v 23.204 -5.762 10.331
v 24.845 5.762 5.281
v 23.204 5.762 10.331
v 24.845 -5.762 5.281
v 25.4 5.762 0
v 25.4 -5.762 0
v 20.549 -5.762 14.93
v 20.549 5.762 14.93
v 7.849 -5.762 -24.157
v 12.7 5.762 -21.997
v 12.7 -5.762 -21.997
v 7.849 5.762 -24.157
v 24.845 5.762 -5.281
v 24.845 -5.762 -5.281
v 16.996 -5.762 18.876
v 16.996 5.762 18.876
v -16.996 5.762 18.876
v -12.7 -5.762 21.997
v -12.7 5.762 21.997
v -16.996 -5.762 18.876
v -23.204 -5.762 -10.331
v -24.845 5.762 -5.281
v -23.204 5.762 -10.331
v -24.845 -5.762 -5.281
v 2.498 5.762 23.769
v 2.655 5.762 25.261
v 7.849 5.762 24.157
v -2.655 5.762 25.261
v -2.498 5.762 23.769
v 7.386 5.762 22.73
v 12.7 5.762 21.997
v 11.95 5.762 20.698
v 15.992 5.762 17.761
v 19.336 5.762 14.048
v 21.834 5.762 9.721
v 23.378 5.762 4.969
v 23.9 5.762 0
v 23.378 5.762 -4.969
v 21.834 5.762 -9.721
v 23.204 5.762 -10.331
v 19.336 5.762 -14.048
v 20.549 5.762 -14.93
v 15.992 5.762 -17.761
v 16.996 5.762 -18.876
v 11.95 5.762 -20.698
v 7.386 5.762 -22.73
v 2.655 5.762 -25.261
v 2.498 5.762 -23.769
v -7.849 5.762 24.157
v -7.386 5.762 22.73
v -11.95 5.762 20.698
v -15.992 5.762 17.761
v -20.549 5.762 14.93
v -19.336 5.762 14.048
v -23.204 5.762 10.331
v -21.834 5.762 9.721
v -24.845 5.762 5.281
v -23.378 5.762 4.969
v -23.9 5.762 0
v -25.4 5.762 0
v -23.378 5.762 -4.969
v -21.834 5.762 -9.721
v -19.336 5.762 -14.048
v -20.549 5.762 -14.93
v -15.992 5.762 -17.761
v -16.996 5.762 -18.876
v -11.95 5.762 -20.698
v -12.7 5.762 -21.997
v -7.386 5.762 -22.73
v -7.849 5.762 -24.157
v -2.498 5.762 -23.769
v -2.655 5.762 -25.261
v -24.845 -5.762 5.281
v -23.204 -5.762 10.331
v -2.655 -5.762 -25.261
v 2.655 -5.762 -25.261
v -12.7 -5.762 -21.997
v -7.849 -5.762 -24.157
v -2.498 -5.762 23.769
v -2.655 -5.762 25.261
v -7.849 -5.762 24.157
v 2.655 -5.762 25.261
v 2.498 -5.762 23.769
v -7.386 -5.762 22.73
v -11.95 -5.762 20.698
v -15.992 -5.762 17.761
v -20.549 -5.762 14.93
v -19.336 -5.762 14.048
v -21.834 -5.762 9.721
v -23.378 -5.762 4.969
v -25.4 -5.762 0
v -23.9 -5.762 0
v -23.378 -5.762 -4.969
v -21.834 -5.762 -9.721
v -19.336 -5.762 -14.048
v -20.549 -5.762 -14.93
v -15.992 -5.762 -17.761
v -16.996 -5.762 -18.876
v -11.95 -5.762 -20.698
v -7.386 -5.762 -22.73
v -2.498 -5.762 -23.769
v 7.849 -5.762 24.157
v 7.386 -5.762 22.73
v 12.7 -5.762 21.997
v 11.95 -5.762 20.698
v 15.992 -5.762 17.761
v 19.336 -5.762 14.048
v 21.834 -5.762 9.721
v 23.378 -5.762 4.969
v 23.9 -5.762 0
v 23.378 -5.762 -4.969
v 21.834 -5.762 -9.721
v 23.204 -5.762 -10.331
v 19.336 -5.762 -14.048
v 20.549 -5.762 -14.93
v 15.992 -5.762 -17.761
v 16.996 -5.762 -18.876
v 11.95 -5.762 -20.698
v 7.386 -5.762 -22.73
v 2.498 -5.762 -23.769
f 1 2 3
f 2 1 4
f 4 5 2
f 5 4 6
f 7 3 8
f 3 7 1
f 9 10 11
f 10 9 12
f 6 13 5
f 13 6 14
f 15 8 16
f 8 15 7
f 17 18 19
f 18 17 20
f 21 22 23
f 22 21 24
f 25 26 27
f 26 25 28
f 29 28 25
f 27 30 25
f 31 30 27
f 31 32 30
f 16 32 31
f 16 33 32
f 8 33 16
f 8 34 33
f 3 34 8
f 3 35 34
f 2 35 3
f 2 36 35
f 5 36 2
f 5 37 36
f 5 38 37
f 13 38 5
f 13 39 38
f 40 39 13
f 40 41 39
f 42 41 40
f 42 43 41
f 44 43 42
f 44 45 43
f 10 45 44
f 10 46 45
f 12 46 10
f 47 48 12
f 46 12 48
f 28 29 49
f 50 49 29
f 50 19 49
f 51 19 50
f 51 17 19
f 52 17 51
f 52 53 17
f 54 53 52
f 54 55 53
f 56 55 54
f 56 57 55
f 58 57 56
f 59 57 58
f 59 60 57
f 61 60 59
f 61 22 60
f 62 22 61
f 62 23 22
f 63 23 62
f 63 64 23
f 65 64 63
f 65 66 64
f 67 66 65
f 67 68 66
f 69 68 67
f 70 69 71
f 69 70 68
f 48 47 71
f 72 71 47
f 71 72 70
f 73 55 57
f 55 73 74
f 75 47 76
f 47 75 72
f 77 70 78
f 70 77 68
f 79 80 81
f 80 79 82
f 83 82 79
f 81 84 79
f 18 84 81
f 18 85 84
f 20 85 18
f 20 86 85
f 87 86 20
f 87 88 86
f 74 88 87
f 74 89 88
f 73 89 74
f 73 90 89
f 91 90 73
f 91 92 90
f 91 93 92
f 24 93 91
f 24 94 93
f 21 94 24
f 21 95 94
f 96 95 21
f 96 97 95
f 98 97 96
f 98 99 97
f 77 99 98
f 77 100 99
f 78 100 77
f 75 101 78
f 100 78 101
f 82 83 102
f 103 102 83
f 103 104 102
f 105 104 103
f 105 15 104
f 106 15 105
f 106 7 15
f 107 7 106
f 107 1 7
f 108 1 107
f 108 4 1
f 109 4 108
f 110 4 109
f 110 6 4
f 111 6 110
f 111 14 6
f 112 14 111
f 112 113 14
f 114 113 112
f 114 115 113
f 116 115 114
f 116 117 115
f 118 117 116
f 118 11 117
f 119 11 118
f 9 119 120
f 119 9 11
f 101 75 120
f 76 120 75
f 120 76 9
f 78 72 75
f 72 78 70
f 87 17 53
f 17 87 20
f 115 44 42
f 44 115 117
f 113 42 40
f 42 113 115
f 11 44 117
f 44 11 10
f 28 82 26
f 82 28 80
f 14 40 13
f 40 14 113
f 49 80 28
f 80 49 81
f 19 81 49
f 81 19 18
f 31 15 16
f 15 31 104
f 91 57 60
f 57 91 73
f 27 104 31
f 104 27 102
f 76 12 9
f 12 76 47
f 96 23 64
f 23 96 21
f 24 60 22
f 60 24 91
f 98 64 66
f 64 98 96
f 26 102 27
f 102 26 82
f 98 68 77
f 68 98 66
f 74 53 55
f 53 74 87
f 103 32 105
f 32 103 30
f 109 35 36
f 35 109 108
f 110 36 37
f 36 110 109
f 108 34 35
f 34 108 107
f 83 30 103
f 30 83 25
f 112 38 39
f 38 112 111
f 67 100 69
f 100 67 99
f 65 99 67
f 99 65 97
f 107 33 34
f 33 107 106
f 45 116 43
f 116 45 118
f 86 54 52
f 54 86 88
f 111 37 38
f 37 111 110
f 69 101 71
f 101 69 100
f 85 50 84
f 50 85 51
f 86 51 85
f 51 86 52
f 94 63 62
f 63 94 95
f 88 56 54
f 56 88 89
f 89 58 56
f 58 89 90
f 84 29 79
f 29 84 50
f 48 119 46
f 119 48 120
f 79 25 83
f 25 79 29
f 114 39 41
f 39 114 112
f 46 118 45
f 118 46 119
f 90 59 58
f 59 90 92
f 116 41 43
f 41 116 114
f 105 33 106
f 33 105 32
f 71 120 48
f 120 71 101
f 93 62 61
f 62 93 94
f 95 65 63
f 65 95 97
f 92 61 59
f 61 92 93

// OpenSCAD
function in_to_mm(in) = in * 25.4;

tube_od = in_to_mm(2);
tube_or = tube_od/2;
tube_t = 1.5;
tube_ir = tube_or - tube_t;
tube_id = tube_ir * 2;


hole_d = in_to_mm(3/4);
hole_r = hole_d/2;

clip_head_t = 2;
clip_head_overlap = 2;
clip_head_r = hole_r + clip_head_overlap;
clip_head_d = clip_head_r * 2;

render()rotate([90,0,0]){
	difference(){
		cylinder(d = tube_od, h = clip_head_r, center = true);
		cylinder(d = tube_id, h = clip_head_r, center = true);
	}
}
